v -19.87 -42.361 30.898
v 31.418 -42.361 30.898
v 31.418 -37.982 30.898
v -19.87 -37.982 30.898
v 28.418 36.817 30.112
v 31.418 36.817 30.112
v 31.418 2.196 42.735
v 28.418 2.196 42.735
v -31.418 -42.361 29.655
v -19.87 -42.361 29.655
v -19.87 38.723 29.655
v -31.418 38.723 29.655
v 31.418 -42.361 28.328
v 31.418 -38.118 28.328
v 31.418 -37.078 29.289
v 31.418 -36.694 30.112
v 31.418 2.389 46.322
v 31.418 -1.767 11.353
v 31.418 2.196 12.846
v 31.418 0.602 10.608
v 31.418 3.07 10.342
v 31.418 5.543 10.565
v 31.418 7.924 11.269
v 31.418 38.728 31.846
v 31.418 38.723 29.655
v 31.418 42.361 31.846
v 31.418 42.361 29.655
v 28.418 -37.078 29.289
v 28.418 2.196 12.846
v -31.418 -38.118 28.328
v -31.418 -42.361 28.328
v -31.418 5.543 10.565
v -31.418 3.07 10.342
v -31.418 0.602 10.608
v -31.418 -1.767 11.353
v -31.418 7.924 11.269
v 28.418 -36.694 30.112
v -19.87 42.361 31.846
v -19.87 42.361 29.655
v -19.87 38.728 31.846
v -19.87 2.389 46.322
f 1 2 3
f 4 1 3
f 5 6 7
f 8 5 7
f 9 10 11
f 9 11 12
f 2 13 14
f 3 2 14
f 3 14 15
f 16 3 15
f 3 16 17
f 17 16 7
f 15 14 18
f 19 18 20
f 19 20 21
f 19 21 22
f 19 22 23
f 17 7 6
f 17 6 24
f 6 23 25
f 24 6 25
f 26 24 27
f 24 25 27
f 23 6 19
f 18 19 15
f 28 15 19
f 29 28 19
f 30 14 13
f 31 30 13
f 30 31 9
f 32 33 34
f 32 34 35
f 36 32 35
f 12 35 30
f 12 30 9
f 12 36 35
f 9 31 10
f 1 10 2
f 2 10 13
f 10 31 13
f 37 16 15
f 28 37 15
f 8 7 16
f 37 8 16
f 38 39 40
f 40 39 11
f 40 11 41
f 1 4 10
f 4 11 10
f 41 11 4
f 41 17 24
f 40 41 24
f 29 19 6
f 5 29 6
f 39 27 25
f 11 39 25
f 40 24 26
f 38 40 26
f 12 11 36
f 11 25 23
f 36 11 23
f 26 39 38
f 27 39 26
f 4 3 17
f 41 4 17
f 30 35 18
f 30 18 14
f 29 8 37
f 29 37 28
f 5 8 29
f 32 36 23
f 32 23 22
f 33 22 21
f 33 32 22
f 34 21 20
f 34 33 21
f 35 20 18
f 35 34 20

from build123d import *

# Parameters (mm, degrees)
SKETCH4_W           = 62.83623107
SKETCH4_H           = 84.722256574
BOSS_EXTRUDE2_DEPTH = 50
CUT_EXTRUDE2_DEPTH  = 80
CUT_EXTRUDE3_DEPTH  = 80
CUT_EXTRUDE5_DEPTH  = 80
CUT_EXTRUDE6_DEPTH  = 3
CUT_EXTRUDE8_DEPTH  = 80


with BuildPart() as part:
    # Sketch4 → Boss-Extrude2 (new body)
    with BuildSketch(Plane.XY):
        Rectangle(SKETCH4_W, SKETCH4_H)
    extrude(amount=BOSS_EXTRUDE2_DEPTH)

    # Sketch5 → Cut-Extrude2 (cut)
    with BuildSketch(Plane(origin=(31.418115535, 0, 0), x_dir=(0, 0, -1), z_dir=(1, 0, 0))):
        Polygon((-31.846034257, 38.728174008), (-31.846034257, 42.361128287), (-50, 42.361128287), (-50, -42.361128287), (-30.898434646, -42.361128287), (-30.898434646, -37.982426726), (-46.322270236, 2.38891709), align=None)
    extrude(amount=-CUT_EXTRUDE2_DEPTH, mode=Mode.SUBTRACT)

    # Sketch6 → Cut-Extrude3 (cut)
    with BuildSketch(Plane(origin=(31.418115535, 0, 0), x_dir=(0, 0, -1), z_dir=(1, 0, 0))):
        Polygon((-29.655383969, 42.361128287), (-29.655383969, 38.722554473), (-8.776416022, 3.750158878), (-28.328453067, -38.117745), (-28.328453067, -42.361128287), (-27.677514405, -46.625913761), (16.839811583, -52.045359618), (10.267667228, 27.190343951), (3.73953172, 54.484047391), align=None)
    extrude(amount=-CUT_EXTRUDE3_DEPTH, mode=Mode.SUBTRACT)

    # Sketch7 → Cut-Extrude5 (cut)
    with BuildSketch(Plane.ZY.offset(31.418115535)):
        with BuildLine():
            ThreePointArc((13.228873585, 11.208051798), (10.417703783, 4.563945687), (11.71087014, -2.533556863))
            ThreePointArc((11.71087014, -2.533556863), (0.747619784, 5.632177302), (13.228873585, 11.208051798))
        make_face()
    extrude(amount=-CUT_EXTRUDE5_DEPTH, mode=Mode.SUBTRACT)

    # Sketch8 → Cut-Extrude6 (cut)
    with BuildSketch(Plane(origin=(31.418115535, 0, 0), x_dir=(0, 0, -1), z_dir=(1, 0, 0))):
        Polygon((-30.111598921, 36.817435747), (-42.735074125, 2.19595341), (-30.111598921, -36.694083179), (-29.289064541, -37.07820135), (-12.845557678, 2.19595341), align=None)
    extrude(amount=-CUT_EXTRUDE6_DEPTH, mode=Mode.SUBTRACT)

    # Sketch9 → Cut-Extrude8 (cut)
    with BuildSketch(Plane(origin=(0, 0, 29.655383969), x_dir=(-1, 0, 0), z_dir=(0, 0, -1))):
        Polygon((19.869908303, 42.361128287), (19.869908303, 38.722554473), (19.869908303, 5.586987563), (19.869908303, -4.186945454), (19.869908303, -38.208459621), (19.869908303, -42.059759196), (19.869908303, -47.026854784), (41.256673117, -49.585938288), (42.081255469, -21.197702537), (42.081255469, 12.428184914), (37.482224788, 37.513066745), (31.418115535, 49.4837873), align=None)
    extrude(amount=-CUT_EXTRUDE8_DEPTH, mode=Mode.SUBTRACT)


solid = part.part
